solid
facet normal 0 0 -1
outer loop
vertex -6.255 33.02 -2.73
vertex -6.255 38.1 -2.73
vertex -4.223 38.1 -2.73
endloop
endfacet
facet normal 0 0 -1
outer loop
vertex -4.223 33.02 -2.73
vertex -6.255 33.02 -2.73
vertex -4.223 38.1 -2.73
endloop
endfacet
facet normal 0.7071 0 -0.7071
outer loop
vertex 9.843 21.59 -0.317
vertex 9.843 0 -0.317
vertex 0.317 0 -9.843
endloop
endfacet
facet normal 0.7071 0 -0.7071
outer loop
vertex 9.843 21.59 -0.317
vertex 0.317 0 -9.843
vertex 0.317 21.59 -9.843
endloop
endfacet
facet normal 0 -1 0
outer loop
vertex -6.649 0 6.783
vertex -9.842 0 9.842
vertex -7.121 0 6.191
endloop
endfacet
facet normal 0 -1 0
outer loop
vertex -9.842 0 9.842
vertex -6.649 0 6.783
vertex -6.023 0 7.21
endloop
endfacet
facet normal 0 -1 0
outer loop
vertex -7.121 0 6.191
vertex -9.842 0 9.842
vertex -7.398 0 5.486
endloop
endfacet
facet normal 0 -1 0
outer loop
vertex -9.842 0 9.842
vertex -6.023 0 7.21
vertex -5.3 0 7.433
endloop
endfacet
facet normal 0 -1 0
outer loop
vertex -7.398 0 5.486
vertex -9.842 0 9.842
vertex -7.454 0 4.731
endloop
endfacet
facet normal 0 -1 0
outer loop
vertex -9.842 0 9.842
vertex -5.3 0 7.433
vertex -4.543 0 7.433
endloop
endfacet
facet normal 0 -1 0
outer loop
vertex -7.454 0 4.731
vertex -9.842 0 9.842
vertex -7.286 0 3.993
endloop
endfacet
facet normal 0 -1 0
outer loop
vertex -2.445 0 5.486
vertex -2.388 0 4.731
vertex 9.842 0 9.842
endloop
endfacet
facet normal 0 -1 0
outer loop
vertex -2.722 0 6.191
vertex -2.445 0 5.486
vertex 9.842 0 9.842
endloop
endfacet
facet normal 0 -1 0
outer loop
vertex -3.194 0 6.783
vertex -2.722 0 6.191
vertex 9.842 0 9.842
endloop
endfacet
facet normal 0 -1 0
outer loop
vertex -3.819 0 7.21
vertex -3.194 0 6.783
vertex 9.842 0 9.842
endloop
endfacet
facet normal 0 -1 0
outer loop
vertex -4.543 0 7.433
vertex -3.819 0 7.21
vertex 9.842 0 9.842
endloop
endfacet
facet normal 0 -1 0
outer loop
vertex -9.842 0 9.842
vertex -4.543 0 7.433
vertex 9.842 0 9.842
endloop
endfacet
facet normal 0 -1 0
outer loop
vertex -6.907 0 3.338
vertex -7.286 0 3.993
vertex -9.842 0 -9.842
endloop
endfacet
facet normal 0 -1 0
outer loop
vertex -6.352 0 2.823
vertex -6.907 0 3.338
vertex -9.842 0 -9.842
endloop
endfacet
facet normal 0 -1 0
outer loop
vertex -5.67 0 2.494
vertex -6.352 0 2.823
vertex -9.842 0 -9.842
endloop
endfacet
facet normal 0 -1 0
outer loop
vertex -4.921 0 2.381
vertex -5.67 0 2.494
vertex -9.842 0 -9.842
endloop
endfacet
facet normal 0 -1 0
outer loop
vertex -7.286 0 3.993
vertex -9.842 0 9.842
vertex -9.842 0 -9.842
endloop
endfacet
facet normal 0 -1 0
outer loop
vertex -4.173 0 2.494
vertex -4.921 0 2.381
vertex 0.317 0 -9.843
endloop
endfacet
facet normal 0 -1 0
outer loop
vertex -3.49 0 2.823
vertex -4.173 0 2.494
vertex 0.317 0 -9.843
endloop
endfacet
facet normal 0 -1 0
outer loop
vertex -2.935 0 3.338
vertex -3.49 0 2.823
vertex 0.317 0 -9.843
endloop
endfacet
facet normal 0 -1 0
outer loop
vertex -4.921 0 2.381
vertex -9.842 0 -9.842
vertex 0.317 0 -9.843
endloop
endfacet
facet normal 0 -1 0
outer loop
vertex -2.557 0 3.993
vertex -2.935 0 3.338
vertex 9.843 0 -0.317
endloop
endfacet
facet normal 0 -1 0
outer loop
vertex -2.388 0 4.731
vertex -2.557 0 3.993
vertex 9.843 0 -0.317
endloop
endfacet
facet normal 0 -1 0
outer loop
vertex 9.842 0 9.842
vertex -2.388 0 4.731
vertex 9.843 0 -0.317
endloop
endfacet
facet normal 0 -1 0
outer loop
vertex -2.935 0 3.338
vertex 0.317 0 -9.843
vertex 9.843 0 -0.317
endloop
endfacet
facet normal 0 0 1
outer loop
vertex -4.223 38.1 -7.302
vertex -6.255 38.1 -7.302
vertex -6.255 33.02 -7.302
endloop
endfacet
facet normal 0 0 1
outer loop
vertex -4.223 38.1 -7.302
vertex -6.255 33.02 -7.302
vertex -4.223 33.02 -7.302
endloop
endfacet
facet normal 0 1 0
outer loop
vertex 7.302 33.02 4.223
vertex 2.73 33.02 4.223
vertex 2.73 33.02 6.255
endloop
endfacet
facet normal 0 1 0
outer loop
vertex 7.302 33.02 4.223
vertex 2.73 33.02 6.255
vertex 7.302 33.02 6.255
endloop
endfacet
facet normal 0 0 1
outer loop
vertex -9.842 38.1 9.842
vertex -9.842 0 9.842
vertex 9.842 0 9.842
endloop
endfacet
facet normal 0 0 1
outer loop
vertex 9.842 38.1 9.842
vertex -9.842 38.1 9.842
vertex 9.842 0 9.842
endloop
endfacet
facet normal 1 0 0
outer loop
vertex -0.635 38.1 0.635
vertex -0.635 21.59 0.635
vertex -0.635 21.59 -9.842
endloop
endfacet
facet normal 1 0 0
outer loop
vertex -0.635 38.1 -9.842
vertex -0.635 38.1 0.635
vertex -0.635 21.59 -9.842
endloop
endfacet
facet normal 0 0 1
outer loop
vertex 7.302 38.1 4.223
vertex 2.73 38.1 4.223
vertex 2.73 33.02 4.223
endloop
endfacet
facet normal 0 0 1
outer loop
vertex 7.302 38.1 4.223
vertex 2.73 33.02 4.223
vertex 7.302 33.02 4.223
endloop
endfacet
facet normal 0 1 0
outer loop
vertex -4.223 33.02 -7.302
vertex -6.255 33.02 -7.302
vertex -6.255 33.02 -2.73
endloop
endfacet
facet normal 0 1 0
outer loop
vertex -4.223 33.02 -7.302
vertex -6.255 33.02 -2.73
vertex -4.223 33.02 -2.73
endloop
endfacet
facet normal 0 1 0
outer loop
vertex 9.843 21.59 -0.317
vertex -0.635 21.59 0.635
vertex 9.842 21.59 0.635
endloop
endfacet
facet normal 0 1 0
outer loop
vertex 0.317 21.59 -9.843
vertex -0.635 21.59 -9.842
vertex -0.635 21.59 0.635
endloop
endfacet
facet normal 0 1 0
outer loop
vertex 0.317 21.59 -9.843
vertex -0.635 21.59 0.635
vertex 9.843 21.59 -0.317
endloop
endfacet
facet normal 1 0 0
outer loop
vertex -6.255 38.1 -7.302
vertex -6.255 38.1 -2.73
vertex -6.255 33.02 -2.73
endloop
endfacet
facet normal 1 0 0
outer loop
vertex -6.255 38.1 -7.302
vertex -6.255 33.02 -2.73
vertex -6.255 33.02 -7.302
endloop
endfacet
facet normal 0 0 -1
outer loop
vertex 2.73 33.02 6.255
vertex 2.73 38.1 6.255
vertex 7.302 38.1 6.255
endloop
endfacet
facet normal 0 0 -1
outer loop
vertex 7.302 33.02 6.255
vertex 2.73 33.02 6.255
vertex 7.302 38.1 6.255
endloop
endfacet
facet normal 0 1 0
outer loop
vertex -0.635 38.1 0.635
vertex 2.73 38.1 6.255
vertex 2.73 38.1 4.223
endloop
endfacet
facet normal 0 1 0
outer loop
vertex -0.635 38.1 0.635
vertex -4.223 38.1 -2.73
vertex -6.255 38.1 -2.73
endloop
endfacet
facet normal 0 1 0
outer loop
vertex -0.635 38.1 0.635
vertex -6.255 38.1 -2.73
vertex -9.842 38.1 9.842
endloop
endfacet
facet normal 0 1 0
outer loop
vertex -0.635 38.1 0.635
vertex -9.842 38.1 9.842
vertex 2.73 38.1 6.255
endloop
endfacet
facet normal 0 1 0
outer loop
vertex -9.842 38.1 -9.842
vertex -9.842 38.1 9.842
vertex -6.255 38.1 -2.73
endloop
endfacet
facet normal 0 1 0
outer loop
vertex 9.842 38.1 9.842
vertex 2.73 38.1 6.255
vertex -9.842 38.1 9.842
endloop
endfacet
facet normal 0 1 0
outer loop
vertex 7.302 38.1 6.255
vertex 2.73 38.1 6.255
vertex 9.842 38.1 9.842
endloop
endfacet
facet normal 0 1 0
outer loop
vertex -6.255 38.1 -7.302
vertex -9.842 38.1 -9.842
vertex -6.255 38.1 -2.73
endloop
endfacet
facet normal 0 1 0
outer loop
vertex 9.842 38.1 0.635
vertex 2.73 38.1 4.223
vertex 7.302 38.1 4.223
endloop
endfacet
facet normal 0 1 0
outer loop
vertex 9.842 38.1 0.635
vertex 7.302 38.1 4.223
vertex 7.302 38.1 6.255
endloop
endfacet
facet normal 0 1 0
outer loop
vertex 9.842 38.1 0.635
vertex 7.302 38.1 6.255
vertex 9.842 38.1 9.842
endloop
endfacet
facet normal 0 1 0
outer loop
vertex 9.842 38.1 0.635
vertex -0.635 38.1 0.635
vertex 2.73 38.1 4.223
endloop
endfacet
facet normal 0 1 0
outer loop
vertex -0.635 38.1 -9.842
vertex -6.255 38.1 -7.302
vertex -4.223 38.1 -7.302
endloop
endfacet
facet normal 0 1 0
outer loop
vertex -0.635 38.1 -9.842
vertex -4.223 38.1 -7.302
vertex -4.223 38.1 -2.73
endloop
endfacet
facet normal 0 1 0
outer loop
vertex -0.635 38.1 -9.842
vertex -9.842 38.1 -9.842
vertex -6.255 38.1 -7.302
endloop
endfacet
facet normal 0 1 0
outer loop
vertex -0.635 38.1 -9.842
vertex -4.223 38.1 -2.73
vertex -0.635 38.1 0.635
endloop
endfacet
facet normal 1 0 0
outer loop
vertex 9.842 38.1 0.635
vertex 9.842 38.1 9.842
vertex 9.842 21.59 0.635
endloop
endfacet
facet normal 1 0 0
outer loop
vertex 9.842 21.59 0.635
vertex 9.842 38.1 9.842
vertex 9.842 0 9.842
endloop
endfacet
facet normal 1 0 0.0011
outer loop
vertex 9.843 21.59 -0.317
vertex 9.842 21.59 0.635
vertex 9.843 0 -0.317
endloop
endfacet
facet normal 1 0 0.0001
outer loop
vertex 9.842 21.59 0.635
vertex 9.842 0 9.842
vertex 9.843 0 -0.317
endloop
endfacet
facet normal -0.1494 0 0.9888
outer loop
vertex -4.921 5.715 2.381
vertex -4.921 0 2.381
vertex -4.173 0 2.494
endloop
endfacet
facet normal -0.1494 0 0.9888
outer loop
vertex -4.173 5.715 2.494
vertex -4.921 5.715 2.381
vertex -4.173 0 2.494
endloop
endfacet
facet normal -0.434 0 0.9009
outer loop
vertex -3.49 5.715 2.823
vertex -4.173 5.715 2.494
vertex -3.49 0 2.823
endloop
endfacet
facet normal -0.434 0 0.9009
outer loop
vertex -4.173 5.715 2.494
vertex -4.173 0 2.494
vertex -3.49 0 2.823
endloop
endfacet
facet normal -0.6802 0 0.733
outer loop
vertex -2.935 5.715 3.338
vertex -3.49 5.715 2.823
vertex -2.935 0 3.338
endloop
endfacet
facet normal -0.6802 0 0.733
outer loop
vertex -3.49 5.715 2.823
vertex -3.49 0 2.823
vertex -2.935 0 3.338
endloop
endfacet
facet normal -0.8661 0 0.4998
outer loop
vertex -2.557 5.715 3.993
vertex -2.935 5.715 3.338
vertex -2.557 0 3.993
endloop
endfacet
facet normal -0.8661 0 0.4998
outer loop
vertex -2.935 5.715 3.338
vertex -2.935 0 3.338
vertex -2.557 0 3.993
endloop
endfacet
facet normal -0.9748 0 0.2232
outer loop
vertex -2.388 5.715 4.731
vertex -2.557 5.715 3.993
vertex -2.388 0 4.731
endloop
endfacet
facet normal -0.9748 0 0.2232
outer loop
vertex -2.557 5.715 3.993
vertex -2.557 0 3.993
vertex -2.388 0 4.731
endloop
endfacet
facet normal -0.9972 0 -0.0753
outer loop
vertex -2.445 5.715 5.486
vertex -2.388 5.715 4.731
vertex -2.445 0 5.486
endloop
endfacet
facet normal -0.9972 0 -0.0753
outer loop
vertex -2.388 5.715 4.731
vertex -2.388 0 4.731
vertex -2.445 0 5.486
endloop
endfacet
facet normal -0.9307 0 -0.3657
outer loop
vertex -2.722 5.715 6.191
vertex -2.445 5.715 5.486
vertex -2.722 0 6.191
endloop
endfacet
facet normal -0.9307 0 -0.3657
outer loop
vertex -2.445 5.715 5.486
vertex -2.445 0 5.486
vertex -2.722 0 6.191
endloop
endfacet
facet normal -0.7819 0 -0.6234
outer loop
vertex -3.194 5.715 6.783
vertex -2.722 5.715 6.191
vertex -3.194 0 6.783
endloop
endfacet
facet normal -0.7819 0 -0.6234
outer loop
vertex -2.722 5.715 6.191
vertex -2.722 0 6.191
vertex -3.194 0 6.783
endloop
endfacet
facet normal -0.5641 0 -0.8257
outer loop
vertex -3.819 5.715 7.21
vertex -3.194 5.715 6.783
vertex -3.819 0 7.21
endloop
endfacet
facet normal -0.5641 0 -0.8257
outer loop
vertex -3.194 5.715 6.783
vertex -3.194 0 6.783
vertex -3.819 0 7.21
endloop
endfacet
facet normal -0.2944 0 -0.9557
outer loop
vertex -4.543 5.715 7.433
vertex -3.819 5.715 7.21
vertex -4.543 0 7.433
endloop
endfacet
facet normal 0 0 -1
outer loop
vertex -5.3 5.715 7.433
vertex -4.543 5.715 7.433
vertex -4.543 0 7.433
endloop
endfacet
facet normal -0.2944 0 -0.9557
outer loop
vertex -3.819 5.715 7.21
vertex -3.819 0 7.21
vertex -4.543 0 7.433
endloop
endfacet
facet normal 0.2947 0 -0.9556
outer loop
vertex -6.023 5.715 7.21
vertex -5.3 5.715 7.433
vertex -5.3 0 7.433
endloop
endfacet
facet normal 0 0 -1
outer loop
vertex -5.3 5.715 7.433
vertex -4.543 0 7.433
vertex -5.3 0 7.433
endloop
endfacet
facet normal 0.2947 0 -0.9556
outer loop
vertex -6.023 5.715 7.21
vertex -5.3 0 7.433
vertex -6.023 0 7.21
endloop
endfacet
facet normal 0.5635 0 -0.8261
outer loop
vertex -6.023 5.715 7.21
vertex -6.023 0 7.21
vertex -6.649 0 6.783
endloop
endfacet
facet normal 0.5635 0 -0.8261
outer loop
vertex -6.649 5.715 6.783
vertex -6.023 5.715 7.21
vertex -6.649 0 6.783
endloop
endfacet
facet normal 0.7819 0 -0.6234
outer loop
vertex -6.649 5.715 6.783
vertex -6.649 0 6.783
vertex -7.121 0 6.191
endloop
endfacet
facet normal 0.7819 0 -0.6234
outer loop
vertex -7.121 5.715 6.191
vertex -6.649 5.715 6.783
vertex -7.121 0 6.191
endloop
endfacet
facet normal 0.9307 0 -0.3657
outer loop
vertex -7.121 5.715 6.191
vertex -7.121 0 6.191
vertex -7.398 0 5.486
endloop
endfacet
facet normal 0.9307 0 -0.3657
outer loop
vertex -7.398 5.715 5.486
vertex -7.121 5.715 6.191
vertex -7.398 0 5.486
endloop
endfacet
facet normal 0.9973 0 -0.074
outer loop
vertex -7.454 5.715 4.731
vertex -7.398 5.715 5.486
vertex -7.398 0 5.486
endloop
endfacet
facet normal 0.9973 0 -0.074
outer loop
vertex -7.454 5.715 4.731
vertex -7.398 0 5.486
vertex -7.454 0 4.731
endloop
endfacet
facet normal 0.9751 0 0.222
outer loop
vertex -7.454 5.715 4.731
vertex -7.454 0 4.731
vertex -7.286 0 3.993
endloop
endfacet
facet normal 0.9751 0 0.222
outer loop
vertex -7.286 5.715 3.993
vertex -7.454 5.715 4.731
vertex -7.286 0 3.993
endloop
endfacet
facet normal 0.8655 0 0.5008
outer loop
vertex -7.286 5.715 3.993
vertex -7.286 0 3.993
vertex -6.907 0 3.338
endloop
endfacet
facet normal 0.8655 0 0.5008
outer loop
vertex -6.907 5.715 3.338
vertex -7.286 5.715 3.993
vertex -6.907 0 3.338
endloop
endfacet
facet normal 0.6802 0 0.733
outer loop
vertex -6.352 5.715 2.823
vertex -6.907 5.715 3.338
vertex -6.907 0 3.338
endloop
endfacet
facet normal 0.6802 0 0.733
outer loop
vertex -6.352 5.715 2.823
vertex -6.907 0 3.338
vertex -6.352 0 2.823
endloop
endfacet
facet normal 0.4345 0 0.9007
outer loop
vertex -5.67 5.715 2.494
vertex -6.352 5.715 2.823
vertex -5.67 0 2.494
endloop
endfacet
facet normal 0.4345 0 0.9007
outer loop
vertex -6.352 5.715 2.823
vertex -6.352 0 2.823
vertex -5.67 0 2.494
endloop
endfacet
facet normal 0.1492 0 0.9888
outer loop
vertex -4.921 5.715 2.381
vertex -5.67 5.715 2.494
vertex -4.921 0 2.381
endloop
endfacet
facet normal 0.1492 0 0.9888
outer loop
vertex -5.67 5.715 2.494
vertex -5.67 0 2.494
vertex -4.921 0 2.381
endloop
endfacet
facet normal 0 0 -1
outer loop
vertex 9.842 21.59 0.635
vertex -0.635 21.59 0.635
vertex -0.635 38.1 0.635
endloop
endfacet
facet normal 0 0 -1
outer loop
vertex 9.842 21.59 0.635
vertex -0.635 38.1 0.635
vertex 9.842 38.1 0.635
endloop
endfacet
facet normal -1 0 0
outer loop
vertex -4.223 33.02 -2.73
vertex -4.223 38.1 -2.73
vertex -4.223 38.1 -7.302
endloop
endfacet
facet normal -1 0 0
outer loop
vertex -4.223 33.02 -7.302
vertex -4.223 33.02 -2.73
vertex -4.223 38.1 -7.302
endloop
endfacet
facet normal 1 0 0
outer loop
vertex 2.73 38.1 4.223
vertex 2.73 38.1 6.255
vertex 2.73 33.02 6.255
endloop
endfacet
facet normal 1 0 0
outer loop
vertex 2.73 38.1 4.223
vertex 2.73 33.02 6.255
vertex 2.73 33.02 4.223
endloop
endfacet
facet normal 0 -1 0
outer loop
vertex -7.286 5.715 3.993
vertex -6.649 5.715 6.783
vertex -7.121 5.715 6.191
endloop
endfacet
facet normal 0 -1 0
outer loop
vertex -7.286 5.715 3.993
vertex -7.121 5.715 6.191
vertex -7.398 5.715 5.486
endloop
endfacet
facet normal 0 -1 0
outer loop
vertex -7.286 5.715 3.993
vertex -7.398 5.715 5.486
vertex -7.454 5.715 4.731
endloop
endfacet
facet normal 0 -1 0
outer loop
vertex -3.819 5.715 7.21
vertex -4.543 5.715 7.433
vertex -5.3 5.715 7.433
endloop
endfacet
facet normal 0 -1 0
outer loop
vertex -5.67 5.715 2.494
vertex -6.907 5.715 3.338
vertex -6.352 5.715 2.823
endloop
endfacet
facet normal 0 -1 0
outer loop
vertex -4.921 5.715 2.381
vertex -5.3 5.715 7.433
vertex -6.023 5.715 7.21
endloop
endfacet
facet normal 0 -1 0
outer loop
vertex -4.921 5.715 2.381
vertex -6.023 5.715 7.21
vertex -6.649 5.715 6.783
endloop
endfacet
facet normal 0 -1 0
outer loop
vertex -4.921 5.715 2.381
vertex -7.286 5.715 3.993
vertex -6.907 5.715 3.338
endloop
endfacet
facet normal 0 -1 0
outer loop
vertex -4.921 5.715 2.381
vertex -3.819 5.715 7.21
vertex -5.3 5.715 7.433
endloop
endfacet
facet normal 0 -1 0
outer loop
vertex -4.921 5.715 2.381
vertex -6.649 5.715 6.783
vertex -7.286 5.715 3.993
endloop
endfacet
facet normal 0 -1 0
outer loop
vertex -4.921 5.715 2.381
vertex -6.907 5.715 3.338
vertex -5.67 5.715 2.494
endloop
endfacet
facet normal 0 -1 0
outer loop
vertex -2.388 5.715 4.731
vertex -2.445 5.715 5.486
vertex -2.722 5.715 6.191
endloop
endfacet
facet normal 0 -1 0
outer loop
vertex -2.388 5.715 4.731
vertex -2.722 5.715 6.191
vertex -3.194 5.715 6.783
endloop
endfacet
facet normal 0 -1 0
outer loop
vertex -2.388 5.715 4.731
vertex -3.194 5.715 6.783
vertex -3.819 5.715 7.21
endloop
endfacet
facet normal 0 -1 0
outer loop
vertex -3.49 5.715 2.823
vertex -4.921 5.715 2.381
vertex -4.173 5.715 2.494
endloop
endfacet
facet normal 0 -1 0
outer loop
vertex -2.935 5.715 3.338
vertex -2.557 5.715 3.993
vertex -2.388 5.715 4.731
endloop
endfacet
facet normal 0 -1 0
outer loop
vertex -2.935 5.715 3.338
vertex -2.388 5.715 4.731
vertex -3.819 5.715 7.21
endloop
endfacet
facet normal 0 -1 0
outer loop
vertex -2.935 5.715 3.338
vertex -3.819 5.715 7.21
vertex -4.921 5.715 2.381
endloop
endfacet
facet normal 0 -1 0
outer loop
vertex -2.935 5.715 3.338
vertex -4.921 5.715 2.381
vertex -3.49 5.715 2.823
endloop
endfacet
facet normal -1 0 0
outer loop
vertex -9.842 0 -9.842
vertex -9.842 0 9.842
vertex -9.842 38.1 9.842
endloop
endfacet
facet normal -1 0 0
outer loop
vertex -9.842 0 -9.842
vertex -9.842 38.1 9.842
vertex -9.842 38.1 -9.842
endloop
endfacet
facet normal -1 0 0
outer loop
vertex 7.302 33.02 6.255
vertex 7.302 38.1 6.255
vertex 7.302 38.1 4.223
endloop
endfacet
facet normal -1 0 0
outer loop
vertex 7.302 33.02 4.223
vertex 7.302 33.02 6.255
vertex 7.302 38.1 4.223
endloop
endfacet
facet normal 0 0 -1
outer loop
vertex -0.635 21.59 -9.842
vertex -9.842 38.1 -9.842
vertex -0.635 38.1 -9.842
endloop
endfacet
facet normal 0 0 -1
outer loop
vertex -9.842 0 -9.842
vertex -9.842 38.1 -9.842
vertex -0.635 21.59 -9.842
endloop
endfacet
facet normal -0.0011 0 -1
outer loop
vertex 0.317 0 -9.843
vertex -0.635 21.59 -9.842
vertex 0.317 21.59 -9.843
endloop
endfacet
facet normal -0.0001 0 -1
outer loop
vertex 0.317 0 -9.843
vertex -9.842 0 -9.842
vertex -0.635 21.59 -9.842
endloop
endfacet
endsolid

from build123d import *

# Parameters (mm, degrees)
SKETCH3_W           = 19.685
SKETCH3_H           = 19.685
BOSS_EXTRUDE2_DEPTH = 38.1
SKETCH5_R           = 2.54
CUT_EXTRUDE2_DEPTH  = 5.715
SKETCH6_W           = 10.4775
SKETCH6_H           = 10.4775
CUT_EXTRUDE3_DEPTH  = 16.51
SKETCH7_W           = 2.032
SKETCH7_H           = 4.572
SKETCH7_W_2         = 4.572
SKETCH7_H_2         = 2.032
CUT_EXTRUDE4_DEPTH  = 5.08
CHAMFER1_SIZE       = 9.525


with BuildPart() as part:
    # Sketch3 → Boss-Extrude2 (new body)
    with BuildSketch(Plane(origin=(0, 0, 0), x_dir=(1, 0, 0), z_dir=(0, 1, 0))):
        Rectangle(SKETCH3_W, SKETCH3_H)
    extrude(amount=BOSS_EXTRUDE2_DEPTH)

    # Sketch5 → Cut-Extrude2 (cut)
    with BuildSketch(Plane.XZ):
        with Locations(Location((-4.92125, 4.92125, 0), (0, 0, 270))):
            Circle(SKETCH5_R)
    extrude(amount=-CUT_EXTRUDE2_DEPTH, mode=Mode.SUBTRACT)

    # Sketch6 → Cut-Extrude3 (cut)
    with BuildSketch(Plane(origin=(0, 38.1, 0), x_dir=(1, 0, 0), z_dir=(0, 1, 0))):
        with Locations((4.60375, 4.60375)):
            Rectangle(SKETCH6_W, SKETCH6_H)
    extrude(amount=-CUT_EXTRUDE3_DEPTH, mode=Mode.SUBTRACT)

    # Sketch7 → Cut-Extrude4 (cut)
    with BuildSketch(Plane(origin=(0, 38.1, 0), x_dir=(1, 0, 0), z_dir=(0, 1, 0))):
        with Locations((-5.23875, 5.0165)):
            Rectangle(SKETCH7_W, SKETCH7_H)
        with Locations((5.0165, -5.23875)):
            Rectangle(SKETCH7_W_2, SKETCH7_H_2)
    extrude(amount=-CUT_EXTRUDE4_DEPTH, mode=Mode.SUBTRACT)

    # Chamfer1
    chamfer1_edges = [part.edges().sort_by_distance(p)[0] for p in [
        (9.8425, 10.795, -9.8425),
    ]]
    chamfer(chamfer1_edges, length=CHAMFER1_SIZE)


solid = part.part
